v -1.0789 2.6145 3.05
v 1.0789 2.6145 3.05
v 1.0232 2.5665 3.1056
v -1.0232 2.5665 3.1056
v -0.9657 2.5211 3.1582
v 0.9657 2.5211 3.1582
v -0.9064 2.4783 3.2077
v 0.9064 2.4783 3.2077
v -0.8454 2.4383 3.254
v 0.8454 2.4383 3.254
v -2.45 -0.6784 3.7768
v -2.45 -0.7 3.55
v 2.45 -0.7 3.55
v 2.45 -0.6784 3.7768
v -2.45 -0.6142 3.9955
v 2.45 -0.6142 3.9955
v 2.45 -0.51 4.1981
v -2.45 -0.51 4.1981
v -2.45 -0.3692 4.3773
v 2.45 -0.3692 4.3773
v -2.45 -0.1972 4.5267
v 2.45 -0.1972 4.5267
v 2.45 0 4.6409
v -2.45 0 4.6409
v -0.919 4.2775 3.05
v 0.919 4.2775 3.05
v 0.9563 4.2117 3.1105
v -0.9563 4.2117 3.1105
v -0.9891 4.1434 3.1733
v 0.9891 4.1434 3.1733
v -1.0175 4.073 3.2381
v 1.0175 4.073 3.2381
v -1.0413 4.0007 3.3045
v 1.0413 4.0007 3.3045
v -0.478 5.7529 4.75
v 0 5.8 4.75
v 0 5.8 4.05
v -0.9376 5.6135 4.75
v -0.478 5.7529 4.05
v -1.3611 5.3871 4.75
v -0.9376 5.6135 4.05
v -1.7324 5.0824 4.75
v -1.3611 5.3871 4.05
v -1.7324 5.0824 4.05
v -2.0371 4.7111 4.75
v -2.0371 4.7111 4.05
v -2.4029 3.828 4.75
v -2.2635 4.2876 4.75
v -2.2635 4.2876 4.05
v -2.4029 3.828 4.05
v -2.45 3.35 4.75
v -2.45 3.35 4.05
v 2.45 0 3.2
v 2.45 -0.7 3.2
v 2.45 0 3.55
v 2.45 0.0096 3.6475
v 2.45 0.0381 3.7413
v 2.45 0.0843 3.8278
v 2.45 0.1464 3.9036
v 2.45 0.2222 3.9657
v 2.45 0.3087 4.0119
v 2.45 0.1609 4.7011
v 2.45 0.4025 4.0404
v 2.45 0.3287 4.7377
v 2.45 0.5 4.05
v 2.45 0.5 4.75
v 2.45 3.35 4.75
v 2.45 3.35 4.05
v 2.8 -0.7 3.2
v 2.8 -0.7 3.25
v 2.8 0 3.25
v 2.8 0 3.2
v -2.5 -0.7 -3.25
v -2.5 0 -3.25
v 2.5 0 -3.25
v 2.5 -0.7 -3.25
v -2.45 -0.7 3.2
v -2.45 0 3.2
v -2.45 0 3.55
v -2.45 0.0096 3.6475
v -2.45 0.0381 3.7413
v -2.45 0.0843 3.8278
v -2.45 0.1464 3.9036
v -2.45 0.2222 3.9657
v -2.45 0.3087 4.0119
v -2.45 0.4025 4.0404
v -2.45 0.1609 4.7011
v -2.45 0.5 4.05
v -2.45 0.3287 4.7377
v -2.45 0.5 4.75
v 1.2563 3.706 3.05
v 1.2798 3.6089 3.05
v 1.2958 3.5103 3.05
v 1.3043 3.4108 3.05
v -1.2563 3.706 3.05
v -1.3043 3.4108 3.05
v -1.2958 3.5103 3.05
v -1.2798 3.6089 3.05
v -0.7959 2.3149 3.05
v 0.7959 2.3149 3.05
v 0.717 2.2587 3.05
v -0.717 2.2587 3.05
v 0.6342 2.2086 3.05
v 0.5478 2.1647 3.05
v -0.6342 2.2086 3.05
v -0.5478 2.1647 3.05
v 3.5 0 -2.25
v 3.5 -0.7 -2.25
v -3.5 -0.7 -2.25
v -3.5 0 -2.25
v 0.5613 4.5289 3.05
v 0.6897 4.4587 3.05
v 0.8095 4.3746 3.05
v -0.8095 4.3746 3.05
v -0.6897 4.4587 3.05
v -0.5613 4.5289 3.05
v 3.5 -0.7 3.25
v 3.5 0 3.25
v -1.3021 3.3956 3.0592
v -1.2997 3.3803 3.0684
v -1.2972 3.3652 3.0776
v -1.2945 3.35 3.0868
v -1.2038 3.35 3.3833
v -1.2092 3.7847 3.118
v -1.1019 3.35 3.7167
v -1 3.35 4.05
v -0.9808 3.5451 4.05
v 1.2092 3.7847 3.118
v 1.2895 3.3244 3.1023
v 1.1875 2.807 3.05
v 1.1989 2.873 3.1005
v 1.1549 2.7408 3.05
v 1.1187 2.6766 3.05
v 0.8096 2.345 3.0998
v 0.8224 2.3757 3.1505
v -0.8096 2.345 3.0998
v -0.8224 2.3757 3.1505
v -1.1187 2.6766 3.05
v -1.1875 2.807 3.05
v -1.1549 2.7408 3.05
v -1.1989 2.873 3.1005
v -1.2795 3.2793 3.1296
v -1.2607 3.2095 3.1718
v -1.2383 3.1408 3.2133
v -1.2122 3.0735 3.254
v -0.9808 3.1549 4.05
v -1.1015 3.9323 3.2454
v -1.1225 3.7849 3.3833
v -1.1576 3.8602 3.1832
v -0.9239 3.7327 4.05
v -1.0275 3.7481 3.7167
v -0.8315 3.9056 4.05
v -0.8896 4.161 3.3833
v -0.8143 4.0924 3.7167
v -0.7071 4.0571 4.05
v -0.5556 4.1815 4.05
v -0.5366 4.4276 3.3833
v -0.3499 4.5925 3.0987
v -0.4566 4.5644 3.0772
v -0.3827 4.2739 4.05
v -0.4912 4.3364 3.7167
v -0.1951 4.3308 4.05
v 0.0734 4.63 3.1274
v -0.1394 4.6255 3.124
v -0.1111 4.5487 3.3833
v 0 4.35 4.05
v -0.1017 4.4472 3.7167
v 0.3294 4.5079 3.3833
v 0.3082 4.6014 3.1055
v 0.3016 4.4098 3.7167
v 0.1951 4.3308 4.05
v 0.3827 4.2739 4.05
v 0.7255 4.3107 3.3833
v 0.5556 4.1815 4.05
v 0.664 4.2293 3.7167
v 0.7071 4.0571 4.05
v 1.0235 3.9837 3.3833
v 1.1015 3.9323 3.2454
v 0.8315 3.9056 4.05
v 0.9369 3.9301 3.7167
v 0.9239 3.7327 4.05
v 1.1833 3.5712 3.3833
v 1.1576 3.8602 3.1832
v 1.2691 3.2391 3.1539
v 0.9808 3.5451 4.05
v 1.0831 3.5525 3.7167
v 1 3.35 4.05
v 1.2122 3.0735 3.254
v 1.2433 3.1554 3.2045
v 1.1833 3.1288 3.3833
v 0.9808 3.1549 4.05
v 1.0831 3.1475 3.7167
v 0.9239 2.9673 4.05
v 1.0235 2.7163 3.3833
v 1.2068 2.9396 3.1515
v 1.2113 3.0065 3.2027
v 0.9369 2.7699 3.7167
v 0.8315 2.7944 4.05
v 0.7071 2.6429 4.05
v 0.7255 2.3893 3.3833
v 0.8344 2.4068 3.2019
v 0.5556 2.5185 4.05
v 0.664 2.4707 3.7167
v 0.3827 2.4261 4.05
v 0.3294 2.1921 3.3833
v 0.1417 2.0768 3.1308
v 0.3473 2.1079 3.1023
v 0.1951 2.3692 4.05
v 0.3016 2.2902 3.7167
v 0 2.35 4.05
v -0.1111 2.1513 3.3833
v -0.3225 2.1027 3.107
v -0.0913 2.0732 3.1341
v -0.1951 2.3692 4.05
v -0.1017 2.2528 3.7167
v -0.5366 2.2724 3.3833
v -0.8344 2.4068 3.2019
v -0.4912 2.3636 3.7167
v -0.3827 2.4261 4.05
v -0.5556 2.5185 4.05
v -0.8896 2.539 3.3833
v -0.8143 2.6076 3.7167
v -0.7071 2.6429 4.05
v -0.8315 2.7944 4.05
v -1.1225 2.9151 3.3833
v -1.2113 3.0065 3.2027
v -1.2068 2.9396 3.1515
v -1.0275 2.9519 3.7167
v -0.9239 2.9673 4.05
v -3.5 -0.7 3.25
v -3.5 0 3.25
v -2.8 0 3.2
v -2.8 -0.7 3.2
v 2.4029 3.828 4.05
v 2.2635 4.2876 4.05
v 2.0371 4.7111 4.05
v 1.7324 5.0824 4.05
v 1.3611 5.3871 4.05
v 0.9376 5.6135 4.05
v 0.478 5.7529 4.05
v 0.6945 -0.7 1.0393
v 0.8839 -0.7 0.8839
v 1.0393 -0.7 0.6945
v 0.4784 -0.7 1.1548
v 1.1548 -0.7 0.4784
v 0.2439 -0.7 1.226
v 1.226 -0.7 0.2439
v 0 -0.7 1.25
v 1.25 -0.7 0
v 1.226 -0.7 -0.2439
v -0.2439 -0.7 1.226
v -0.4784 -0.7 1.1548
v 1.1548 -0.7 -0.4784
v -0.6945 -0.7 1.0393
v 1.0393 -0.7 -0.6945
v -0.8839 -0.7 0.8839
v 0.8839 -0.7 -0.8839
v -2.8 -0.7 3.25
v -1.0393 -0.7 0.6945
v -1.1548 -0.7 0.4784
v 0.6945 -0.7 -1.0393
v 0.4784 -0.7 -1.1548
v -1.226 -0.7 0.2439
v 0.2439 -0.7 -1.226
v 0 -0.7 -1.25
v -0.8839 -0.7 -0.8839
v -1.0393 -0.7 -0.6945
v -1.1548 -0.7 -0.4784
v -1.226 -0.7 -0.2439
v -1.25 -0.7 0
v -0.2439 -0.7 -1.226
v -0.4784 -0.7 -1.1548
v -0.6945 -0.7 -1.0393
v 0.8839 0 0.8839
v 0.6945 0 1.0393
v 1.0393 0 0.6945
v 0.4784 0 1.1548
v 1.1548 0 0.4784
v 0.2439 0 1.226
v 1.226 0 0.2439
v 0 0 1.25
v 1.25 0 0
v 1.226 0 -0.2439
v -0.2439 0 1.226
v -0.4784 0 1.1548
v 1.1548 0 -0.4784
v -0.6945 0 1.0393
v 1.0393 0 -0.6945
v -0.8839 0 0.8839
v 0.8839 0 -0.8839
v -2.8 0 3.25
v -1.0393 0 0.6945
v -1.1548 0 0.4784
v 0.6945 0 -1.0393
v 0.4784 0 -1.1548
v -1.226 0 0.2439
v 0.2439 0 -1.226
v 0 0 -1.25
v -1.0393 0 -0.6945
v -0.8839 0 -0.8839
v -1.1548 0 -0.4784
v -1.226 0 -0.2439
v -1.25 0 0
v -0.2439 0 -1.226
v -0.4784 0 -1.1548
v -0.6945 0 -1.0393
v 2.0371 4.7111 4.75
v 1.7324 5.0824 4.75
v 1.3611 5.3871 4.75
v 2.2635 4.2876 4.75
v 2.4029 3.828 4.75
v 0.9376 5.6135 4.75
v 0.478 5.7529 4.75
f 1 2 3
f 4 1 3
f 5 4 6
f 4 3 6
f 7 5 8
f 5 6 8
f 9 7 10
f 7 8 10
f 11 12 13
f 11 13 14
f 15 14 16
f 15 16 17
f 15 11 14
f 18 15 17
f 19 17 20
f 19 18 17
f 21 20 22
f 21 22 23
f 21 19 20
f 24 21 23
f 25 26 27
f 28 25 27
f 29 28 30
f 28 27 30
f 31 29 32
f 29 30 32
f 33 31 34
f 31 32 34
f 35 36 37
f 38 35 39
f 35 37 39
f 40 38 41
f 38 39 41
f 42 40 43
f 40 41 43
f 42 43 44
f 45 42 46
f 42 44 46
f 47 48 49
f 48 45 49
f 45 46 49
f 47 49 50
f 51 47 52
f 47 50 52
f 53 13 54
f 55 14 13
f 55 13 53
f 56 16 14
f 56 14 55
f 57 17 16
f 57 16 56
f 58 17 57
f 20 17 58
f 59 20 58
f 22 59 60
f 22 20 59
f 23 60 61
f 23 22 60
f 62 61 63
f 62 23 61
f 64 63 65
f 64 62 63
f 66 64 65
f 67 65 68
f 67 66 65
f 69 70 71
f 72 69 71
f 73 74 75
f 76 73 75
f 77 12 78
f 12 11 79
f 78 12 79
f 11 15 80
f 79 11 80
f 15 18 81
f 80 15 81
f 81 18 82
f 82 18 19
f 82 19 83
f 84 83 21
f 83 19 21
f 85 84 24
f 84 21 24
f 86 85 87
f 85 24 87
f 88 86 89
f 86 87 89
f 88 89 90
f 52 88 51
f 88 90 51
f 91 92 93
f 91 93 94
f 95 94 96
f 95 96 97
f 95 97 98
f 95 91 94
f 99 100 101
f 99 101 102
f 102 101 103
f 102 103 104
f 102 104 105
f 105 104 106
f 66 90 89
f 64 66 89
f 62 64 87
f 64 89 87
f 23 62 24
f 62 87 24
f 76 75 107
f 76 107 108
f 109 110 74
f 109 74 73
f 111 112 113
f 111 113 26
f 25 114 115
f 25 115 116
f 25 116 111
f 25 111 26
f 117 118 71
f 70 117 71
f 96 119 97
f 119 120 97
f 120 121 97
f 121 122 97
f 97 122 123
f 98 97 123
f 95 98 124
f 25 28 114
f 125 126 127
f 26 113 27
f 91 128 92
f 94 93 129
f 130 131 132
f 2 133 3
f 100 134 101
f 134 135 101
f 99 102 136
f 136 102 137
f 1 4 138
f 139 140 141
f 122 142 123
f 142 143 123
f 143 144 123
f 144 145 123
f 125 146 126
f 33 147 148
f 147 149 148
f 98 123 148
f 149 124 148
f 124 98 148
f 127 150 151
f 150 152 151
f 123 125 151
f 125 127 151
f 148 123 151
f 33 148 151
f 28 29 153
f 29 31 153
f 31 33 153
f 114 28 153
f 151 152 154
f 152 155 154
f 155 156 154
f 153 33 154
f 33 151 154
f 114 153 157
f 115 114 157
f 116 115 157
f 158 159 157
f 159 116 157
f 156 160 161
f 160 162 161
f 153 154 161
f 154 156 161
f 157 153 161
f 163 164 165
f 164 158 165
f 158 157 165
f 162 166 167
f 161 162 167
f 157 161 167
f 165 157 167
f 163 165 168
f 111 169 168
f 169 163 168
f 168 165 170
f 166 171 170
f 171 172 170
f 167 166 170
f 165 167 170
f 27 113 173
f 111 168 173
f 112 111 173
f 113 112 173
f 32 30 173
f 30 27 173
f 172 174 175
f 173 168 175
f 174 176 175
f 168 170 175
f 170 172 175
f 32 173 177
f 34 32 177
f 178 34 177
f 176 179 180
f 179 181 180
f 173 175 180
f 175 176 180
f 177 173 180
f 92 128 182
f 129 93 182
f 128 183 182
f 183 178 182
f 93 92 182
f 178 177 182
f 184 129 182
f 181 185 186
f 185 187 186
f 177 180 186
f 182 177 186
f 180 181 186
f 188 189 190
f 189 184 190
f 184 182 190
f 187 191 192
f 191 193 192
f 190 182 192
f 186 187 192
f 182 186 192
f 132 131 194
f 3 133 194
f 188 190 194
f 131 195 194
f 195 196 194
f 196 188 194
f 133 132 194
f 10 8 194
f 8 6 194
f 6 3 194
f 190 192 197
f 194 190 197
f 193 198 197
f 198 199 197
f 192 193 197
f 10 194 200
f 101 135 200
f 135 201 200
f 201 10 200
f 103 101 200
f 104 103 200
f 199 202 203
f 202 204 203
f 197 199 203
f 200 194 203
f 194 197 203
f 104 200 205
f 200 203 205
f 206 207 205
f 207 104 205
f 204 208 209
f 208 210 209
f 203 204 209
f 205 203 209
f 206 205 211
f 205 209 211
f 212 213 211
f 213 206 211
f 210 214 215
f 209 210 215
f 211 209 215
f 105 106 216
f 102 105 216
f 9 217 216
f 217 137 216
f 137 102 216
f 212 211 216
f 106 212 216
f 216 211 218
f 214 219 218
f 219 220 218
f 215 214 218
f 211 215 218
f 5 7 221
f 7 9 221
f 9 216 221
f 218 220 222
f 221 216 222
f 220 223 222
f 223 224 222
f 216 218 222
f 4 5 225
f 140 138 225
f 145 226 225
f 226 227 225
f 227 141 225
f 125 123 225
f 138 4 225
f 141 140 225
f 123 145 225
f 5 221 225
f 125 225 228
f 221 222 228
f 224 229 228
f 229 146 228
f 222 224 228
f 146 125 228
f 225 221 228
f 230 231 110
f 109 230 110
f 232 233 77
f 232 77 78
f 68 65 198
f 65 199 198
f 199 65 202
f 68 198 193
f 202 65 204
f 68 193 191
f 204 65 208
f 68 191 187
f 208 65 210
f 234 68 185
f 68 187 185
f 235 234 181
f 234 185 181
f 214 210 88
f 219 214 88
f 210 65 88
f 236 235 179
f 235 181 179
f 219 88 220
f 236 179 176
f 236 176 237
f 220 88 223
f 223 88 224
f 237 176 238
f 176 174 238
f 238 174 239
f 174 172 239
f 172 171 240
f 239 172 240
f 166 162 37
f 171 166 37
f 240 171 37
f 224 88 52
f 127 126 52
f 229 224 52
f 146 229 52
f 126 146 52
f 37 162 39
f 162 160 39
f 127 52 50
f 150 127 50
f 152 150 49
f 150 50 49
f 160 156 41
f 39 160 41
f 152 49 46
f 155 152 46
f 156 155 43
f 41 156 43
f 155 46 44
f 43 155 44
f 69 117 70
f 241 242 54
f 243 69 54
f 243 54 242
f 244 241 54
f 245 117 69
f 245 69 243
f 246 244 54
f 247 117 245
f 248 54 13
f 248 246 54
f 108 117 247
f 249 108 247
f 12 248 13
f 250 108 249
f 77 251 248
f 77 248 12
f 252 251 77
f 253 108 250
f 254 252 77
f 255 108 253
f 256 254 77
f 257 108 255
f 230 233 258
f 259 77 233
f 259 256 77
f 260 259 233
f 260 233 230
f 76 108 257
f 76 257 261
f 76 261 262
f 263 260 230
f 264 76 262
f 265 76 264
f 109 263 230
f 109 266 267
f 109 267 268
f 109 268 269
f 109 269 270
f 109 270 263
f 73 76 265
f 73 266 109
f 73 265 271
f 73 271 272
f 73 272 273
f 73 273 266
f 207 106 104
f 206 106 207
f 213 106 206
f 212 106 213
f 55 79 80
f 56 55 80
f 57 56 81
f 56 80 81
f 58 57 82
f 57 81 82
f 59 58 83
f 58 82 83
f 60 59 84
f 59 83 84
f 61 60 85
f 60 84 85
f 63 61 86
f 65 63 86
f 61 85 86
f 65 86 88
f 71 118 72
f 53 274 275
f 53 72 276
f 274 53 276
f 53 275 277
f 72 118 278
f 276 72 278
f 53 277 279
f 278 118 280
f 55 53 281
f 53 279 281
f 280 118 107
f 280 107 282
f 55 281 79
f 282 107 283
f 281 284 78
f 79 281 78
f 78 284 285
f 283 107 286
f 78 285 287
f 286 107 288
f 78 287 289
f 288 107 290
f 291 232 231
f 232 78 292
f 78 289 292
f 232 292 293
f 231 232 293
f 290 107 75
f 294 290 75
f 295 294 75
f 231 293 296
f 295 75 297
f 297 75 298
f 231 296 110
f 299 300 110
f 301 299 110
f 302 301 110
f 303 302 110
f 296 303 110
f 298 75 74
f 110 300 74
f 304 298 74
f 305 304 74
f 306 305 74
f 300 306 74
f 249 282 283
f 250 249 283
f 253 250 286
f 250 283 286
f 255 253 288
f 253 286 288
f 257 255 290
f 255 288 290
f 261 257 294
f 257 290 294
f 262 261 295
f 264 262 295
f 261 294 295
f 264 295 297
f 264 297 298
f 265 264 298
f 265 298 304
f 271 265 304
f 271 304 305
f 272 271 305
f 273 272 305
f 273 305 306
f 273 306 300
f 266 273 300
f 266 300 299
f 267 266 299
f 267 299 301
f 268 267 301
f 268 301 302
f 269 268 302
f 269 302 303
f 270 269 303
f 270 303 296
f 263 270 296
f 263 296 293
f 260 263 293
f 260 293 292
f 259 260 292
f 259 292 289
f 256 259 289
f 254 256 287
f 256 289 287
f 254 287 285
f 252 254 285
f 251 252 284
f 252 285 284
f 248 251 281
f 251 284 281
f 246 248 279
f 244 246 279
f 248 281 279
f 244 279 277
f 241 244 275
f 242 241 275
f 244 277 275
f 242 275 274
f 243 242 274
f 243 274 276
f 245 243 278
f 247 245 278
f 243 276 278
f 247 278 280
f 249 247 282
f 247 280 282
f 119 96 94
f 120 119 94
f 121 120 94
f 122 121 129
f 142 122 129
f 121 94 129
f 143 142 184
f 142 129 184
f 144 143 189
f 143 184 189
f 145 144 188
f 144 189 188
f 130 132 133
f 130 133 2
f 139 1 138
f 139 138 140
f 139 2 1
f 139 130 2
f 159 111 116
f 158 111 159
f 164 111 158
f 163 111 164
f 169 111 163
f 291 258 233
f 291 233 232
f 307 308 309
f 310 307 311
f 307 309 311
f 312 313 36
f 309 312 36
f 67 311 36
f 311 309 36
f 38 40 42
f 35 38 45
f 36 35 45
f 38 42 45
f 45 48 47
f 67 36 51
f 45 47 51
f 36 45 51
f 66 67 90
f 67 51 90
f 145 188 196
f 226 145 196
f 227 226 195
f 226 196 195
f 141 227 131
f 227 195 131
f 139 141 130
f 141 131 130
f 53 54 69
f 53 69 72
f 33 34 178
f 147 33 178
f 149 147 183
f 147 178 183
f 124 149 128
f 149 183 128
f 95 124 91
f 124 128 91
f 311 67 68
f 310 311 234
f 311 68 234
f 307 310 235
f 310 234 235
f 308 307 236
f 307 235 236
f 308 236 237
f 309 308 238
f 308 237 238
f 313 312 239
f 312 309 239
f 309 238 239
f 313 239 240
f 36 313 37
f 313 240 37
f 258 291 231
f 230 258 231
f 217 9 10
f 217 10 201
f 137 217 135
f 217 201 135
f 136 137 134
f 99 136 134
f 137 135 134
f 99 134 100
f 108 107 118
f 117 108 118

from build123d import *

# Parameters (mm, degrees)
BASE_FLANGE1_DEPTH       = 0.7
EDGE_FLANGE1_START       = -2.45
EDGE_FLANGE1_DEPTH       = 4.9
EDGE_FLANGE1_START_2     = -2.8
EDGE_FLANGE1_2_OUTLINE_W = 0.7
EDGE_FLANGE1_2_OUTLINE_H = 0.05
EDGE_FLANGE1_2_DEPTH     = 0.35
EDGE_FLANGE1_START_3     = 2.45
EDGE_FLANGE1_3_OUTLINE_W = 0.7
EDGE_FLANGE1_3_OUTLINE_H = 0.05
EDGE_FLANGE1_3_DEPTH     = 0.35
EDGE_FLANGE1_4_DEPTH     = 4.9
CUT_EXTRUDE1_DEPTH       = 10
SKETCH10_R               = 1
BOSS_EXTRUDE1_DEPTH      = 1
BOSS_EXTRUDE1_DRAFT      = -17
CUT_EXTRUDE2_DEPTH       = 10.571050099
CHAMFER1_SIZE            = 1
M3_TAPPED_HOLE1_D        = 2.5
M3_TAPPED_HOLE1_DEPTH    = 7.5
M3_TAPPED_HOLE1_TIP      = 0.751075774


# Read off the part's stored shape, not the designer's step: Edge-Flange1
# Sheet-metal steps are written as plain solids
with BuildPart() as part:
    # Sketch1 → Base-Flange1 (new body)
    with BuildSketch(Plane(origin=(0, 0, 0), x_dir=(1, 0, 0), z_dir=(0, 1, 0))):
        Polygon((-2.45, -3.25), (-3.5, -3.25), (-3.5, 3.25), (3.5, 3.25), (3.5, -3.25), (2.45, -3.25), (2.45, -4.75), (-2.45, -4.75), align=None)
    extrude(amount=-BASE_FLANGE1_DEPTH)

    # Edge-Flange1 outline → Edge-Flange1 (cut)
    with BuildSketch(Plane.YZ.offset(EDGE_FLANGE1_START)):
        with BuildLine():
            Line((-0.7, 4.75), (-0.7, 3.55))
            ThreePointArc((-0.7, 3.55), (-0.509950493, 4.198074069), (0, 4.640871211))
            Line((0, 4.640871211), (0, 4.75))
            Line((0, 4.75), (-0.7, 4.75))
        make_face()
    extrude(amount=EDGE_FLANGE1_DEPTH, mode=Mode.SUBTRACT)

    # Edge-Flange1 2 outline → Edge-Flange1 2 (cut)
    with BuildSketch(Plane.YZ.offset(EDGE_FLANGE1_START_2)):
        with Locations((-0.35, 3.225)):
            Rectangle(EDGE_FLANGE1_2_OUTLINE_W, EDGE_FLANGE1_2_OUTLINE_H)
    extrude(amount=EDGE_FLANGE1_2_DEPTH, mode=Mode.SUBTRACT)

    # Edge-Flange1 3 outline → Edge-Flange1 3 (cut)
    with BuildSketch(Plane.YZ.offset(EDGE_FLANGE1_START_3)):
        with Locations((-0.35, 3.225)):
            Rectangle(EDGE_FLANGE1_3_OUTLINE_W, EDGE_FLANGE1_3_OUTLINE_H)
    extrude(amount=EDGE_FLANGE1_3_DEPTH, mode=Mode.SUBTRACT)

    # Edge-Flange1 4 outline → Edge-Flange1 4 (add)
    with BuildSketch(Plane.YZ.offset(EDGE_FLANGE1_START)):
        with BuildLine():
            Line((0, 4.640871211), (0, 3.55))
            ThreePointArc((0, 3.55), (0.146446609, 3.903553391), (0.5, 4.05))
            Line((0.5, 4.05), (5.8, 4.05))
            Line((5.8, 4.05), (5.8, 4.75))
            Line((5.8, 4.75), (0.5, 4.75))
            ThreePointArc((0.5, 4.75), (0.244114727, 4.722400412), (0, 4.640871211))
        make_face()
    extrude(amount=EDGE_FLANGE1_4_DEPTH)

    # Sketch9 → Cut-Extrude1 (cut)
    with BuildSketch(Plane(origin=(0, 0, 4.05), x_dir=(-1, 0, 0), z_dir=(0, 0, -1))):
        with BuildLine():
            ThreePointArc((0, 5.8), (1.732411614, 5.082411614), (2.45, 3.35))
            Line((2.45, 3.35), (2.45, 5.8))
            Line((2.45, 5.8), (0, 5.8))
        make_face()
        with BuildLine():
            ThreePointArc((-2.45, 3.35), (-1.732411614, 5.082411614), (0, 5.8))
            Line((0, 5.8), (-2.45, 5.8))
            Line((-2.45, 5.8), (-2.45, 3.35))
        make_face()
    extrude(amount=-CUT_EXTRUDE1_DEPTH, mode=Mode.SUBTRACT)


with BuildPart() as boss_extrude1_tool:
    # Sketch10 → Boss-Extrude1 (with draft: the straight prism first)
    with BuildSketch(Plane(origin=(0, 0, 4.05), x_dir=(-1, 0, 0), z_dir=(0, 0, -1))):
        with Locations((0, 3.35)):
            Circle(SKETCH10_R)
    extrude(amount=BOSS_EXTRUDE1_DEPTH)
    # Boss-Extrude1: the draft: its side faces are tilted about the plane it starts from
    boss_extrude1_sides = [boss_extrude1_tool.faces().sort_by_distance(p)[0] for p in [
        (1, 3.35, 3.55),
    ]]
    draft(boss_extrude1_sides, Plane(origin=(0, 0, 4.05), x_dir=(-1, 0, 0), z_dir=(0, 0, -1)), BOSS_EXTRUDE1_DRAFT)


with BuildPart() as part_1:
    add(part.part)

    # Boss-Extrude1: add boss_extrude1_tool
    add(boss_extrude1_tool.part)

    # Sketch11 → Cut-Extrude2 (cut, through all)
    with BuildSketch(Plane(origin=(2.45, 0, 0), x_dir=(0, 0, -1), z_dir=(1, 0, 0))):
        Polygon((-3.254043784, 4.795439766), (-2.944980446, 4.391765202), (-3.304503105, 4.000705467), (-2.944980446, 3.584416072), (-3.254043784, 3.073515451), (-2.961297011, 2.691152319), (-3.254043784, 2.43832556), (-2.961297011, 2.261231833), (-3.304503105, 1.887919941), (-2.402542749, 1.887919941), (-2.522383636, 4.908973238), align=None)
    extrude(amount=-CUT_EXTRUDE2_DEPTH, mode=Mode.SUBTRACT)

    # Chamfer1
    chamfer1_edges = [part_1.edges().sort_by_distance(p)[0] for p in [
        (-3.5, -0.35, -3.25),
        (3.5, -0.35, -3.25),
    ]]
    chamfer(chamfer1_edges, length=CHAMFER1_SIZE)

    # M3 Tapped Hole1
    with Locations(Plane(origin=(0, -0.7, 0), x_dir=(-1, 0, 0), z_dir=(0, -1, 0))):
        with Locations((0, 0)):
            Hole(M3_TAPPED_HOLE1_D / 2, depth=M3_TAPPED_HOLE1_DEPTH)
            with Locations((0, 0, -(M3_TAPPED_HOLE1_DEPTH + M3_TAPPED_HOLE1_TIP / 2))):  # 118° drill point
                Cone(0, M3_TAPPED_HOLE1_D / 2, M3_TAPPED_HOLE1_TIP, mode=Mode.SUBTRACT)


solid = part_1.part
